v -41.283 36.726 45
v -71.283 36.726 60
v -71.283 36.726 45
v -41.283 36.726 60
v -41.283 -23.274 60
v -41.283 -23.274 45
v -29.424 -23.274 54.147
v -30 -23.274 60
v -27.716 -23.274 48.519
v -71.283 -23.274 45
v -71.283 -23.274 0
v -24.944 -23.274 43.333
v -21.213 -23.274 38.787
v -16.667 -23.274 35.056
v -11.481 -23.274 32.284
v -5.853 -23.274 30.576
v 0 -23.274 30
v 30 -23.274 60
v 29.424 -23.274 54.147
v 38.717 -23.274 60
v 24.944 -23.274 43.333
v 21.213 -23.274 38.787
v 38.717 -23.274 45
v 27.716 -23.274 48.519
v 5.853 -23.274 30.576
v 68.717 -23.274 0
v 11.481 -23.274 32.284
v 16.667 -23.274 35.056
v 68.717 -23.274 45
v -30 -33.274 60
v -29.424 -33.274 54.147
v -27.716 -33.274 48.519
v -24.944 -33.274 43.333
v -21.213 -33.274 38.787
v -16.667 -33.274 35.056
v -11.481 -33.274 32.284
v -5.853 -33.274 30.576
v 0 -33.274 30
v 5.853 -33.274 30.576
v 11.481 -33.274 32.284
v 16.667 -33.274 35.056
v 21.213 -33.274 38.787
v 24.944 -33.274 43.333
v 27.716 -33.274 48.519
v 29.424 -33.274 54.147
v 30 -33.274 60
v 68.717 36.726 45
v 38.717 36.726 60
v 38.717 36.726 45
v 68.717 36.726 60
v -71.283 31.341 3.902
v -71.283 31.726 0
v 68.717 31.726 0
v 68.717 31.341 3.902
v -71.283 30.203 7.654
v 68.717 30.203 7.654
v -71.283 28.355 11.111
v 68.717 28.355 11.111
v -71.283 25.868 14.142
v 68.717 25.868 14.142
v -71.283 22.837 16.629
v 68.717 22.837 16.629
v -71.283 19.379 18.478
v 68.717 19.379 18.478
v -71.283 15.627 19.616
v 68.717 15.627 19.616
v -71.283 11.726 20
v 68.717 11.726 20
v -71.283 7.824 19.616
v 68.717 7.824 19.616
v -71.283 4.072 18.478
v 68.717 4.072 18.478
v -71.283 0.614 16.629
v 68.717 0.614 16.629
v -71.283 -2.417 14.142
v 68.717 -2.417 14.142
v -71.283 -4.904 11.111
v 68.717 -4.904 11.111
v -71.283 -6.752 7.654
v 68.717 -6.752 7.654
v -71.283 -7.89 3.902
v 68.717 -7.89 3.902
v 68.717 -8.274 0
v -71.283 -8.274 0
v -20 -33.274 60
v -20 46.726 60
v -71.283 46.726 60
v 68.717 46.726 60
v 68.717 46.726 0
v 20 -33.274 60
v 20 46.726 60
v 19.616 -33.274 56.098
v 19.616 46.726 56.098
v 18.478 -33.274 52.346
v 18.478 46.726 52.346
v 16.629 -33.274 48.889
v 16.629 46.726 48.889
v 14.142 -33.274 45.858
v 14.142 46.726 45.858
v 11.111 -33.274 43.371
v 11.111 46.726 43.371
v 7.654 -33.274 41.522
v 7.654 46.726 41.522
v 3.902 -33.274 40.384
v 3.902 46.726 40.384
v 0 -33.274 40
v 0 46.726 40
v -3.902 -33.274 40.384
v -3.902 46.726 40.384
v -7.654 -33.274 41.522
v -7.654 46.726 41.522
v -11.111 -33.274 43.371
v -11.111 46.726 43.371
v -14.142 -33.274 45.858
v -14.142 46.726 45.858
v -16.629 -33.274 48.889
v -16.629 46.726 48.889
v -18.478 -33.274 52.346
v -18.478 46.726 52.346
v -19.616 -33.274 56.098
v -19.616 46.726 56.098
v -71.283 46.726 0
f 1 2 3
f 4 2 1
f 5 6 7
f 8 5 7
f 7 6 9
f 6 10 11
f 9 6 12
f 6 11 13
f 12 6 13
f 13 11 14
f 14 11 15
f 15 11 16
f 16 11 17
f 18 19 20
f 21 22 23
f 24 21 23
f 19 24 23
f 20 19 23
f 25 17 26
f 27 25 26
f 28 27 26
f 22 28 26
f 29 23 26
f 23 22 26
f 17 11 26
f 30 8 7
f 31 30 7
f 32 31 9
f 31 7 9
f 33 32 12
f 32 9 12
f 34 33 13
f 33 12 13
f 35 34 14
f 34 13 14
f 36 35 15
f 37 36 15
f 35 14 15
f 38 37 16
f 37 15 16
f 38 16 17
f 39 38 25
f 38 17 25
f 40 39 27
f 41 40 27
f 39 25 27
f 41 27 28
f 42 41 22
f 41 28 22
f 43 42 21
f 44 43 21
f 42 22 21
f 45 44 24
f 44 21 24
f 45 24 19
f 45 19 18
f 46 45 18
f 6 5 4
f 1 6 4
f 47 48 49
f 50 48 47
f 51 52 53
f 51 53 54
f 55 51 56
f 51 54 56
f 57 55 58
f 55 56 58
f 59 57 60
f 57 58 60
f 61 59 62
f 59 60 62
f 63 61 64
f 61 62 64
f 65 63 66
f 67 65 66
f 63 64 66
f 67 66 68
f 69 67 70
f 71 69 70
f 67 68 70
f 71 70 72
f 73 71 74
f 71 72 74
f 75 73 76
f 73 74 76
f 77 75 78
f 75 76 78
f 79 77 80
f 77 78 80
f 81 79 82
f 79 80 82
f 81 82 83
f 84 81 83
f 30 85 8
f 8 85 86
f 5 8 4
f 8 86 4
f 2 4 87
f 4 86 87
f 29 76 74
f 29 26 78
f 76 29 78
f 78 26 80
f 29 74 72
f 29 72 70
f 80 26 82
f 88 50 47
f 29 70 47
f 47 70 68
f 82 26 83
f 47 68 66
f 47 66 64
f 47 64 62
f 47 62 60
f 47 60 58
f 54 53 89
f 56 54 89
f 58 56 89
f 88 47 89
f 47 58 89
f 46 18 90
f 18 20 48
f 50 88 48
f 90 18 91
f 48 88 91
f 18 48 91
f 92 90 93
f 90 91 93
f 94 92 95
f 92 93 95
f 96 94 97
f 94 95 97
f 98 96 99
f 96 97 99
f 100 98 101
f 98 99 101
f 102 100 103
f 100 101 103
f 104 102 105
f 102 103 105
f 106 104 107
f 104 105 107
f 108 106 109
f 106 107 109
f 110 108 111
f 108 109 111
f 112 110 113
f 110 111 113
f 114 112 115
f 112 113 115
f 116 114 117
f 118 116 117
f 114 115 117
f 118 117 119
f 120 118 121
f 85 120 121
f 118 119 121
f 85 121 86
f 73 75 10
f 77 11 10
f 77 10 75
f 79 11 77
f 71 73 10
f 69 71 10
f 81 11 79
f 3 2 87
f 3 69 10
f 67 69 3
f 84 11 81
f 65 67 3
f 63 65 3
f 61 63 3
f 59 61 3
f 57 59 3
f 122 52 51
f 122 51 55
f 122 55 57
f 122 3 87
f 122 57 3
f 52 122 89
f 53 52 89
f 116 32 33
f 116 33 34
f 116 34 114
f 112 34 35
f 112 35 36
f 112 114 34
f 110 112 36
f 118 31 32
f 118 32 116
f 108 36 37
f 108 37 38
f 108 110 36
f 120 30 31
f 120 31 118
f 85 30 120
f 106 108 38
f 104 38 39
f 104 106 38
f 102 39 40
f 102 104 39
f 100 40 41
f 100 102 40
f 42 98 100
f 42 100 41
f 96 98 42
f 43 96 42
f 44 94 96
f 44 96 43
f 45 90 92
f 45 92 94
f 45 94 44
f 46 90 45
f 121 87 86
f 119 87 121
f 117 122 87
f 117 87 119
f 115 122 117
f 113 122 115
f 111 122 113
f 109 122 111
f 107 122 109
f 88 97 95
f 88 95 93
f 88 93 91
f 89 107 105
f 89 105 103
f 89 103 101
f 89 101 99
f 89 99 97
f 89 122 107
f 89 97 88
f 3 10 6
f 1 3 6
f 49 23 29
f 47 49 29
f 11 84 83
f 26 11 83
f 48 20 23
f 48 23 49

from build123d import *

# Parameters (mm, degrees)
F0_W      = 140
F0_H      = 70
F1_DEPTH  = 60
F3_DEPTH  = 140
F5_DEPTH  = 70
F6_DEPTH  = 10
F7_W      = 30
F7_H      = 60
F8_DEPTH  = 15
F9_W      = 30
F9_H      = 60
F10_DEPTH = 15


with BuildPart() as f1:
    # F0 (on Top) → F1 (new body)
    with BuildSketch(Plane.XY):
        with Locations((-1.2832614383, 11.7256036028)):
            Rectangle(F0_W, F0_H)
    extrude(amount=F1_DEPTH)

    # F2 (on face) → F3 (cut)
    with BuildSketch(Plane.YZ.offset(68.7167385617)):
        with BuildLine():
            Line((-8.2743963972, 0), (31.7256036028, 0))
            ThreePointArc((31.7256036028, 0), (11.7256036028, 20), (-8.2743963972, 0))
        make_face()
    extrude(amount=-F3_DEPTH, mode=Mode.SUBTRACT)

    # F4 (on face) → F5 (cut)
    with BuildSketch(Plane.XZ.offset(23.2743963972)):
        with BuildLine():
            ThreePointArc((-20, 60), (0, 40), (20, 60))
            Line((20, 60), (-20, 60))
        make_face()
    extrude(amount=-F5_DEPTH, mode=Mode.SUBTRACT)

    # F4 (on face) → F6 (join)
    with BuildSketch(Plane.XZ.offset(23.2743963972)):
        with BuildLine():
            Line((30, 60), (20, 60))
            ThreePointArc((20, 60), (0, 40), (-20, 60))
            Line((-20, 60), (-30, 60))
            ThreePointArc((-30, 60), (0, 30), (30, 60))
        make_face()
    extrude(amount=F6_DEPTH)

    # F7 (on face) → F8 (cut)
    with BuildSketch(Plane.XY.offset(60)):
        with Locations((-56.2832614383, 6.7256036028)):
            Rectangle(F7_W, F7_H)
    extrude(amount=-F8_DEPTH, mode=Mode.SUBTRACT)

    # F9 (on face) → F10 (cut)
    with BuildSketch(Plane.XY.offset(60)):
        with Locations((53.7167385617, 6.7256036028)):
            Rectangle(F9_W, F9_H)
    extrude(amount=-F10_DEPTH, mode=Mode.SUBTRACT)


solid = f1.part
